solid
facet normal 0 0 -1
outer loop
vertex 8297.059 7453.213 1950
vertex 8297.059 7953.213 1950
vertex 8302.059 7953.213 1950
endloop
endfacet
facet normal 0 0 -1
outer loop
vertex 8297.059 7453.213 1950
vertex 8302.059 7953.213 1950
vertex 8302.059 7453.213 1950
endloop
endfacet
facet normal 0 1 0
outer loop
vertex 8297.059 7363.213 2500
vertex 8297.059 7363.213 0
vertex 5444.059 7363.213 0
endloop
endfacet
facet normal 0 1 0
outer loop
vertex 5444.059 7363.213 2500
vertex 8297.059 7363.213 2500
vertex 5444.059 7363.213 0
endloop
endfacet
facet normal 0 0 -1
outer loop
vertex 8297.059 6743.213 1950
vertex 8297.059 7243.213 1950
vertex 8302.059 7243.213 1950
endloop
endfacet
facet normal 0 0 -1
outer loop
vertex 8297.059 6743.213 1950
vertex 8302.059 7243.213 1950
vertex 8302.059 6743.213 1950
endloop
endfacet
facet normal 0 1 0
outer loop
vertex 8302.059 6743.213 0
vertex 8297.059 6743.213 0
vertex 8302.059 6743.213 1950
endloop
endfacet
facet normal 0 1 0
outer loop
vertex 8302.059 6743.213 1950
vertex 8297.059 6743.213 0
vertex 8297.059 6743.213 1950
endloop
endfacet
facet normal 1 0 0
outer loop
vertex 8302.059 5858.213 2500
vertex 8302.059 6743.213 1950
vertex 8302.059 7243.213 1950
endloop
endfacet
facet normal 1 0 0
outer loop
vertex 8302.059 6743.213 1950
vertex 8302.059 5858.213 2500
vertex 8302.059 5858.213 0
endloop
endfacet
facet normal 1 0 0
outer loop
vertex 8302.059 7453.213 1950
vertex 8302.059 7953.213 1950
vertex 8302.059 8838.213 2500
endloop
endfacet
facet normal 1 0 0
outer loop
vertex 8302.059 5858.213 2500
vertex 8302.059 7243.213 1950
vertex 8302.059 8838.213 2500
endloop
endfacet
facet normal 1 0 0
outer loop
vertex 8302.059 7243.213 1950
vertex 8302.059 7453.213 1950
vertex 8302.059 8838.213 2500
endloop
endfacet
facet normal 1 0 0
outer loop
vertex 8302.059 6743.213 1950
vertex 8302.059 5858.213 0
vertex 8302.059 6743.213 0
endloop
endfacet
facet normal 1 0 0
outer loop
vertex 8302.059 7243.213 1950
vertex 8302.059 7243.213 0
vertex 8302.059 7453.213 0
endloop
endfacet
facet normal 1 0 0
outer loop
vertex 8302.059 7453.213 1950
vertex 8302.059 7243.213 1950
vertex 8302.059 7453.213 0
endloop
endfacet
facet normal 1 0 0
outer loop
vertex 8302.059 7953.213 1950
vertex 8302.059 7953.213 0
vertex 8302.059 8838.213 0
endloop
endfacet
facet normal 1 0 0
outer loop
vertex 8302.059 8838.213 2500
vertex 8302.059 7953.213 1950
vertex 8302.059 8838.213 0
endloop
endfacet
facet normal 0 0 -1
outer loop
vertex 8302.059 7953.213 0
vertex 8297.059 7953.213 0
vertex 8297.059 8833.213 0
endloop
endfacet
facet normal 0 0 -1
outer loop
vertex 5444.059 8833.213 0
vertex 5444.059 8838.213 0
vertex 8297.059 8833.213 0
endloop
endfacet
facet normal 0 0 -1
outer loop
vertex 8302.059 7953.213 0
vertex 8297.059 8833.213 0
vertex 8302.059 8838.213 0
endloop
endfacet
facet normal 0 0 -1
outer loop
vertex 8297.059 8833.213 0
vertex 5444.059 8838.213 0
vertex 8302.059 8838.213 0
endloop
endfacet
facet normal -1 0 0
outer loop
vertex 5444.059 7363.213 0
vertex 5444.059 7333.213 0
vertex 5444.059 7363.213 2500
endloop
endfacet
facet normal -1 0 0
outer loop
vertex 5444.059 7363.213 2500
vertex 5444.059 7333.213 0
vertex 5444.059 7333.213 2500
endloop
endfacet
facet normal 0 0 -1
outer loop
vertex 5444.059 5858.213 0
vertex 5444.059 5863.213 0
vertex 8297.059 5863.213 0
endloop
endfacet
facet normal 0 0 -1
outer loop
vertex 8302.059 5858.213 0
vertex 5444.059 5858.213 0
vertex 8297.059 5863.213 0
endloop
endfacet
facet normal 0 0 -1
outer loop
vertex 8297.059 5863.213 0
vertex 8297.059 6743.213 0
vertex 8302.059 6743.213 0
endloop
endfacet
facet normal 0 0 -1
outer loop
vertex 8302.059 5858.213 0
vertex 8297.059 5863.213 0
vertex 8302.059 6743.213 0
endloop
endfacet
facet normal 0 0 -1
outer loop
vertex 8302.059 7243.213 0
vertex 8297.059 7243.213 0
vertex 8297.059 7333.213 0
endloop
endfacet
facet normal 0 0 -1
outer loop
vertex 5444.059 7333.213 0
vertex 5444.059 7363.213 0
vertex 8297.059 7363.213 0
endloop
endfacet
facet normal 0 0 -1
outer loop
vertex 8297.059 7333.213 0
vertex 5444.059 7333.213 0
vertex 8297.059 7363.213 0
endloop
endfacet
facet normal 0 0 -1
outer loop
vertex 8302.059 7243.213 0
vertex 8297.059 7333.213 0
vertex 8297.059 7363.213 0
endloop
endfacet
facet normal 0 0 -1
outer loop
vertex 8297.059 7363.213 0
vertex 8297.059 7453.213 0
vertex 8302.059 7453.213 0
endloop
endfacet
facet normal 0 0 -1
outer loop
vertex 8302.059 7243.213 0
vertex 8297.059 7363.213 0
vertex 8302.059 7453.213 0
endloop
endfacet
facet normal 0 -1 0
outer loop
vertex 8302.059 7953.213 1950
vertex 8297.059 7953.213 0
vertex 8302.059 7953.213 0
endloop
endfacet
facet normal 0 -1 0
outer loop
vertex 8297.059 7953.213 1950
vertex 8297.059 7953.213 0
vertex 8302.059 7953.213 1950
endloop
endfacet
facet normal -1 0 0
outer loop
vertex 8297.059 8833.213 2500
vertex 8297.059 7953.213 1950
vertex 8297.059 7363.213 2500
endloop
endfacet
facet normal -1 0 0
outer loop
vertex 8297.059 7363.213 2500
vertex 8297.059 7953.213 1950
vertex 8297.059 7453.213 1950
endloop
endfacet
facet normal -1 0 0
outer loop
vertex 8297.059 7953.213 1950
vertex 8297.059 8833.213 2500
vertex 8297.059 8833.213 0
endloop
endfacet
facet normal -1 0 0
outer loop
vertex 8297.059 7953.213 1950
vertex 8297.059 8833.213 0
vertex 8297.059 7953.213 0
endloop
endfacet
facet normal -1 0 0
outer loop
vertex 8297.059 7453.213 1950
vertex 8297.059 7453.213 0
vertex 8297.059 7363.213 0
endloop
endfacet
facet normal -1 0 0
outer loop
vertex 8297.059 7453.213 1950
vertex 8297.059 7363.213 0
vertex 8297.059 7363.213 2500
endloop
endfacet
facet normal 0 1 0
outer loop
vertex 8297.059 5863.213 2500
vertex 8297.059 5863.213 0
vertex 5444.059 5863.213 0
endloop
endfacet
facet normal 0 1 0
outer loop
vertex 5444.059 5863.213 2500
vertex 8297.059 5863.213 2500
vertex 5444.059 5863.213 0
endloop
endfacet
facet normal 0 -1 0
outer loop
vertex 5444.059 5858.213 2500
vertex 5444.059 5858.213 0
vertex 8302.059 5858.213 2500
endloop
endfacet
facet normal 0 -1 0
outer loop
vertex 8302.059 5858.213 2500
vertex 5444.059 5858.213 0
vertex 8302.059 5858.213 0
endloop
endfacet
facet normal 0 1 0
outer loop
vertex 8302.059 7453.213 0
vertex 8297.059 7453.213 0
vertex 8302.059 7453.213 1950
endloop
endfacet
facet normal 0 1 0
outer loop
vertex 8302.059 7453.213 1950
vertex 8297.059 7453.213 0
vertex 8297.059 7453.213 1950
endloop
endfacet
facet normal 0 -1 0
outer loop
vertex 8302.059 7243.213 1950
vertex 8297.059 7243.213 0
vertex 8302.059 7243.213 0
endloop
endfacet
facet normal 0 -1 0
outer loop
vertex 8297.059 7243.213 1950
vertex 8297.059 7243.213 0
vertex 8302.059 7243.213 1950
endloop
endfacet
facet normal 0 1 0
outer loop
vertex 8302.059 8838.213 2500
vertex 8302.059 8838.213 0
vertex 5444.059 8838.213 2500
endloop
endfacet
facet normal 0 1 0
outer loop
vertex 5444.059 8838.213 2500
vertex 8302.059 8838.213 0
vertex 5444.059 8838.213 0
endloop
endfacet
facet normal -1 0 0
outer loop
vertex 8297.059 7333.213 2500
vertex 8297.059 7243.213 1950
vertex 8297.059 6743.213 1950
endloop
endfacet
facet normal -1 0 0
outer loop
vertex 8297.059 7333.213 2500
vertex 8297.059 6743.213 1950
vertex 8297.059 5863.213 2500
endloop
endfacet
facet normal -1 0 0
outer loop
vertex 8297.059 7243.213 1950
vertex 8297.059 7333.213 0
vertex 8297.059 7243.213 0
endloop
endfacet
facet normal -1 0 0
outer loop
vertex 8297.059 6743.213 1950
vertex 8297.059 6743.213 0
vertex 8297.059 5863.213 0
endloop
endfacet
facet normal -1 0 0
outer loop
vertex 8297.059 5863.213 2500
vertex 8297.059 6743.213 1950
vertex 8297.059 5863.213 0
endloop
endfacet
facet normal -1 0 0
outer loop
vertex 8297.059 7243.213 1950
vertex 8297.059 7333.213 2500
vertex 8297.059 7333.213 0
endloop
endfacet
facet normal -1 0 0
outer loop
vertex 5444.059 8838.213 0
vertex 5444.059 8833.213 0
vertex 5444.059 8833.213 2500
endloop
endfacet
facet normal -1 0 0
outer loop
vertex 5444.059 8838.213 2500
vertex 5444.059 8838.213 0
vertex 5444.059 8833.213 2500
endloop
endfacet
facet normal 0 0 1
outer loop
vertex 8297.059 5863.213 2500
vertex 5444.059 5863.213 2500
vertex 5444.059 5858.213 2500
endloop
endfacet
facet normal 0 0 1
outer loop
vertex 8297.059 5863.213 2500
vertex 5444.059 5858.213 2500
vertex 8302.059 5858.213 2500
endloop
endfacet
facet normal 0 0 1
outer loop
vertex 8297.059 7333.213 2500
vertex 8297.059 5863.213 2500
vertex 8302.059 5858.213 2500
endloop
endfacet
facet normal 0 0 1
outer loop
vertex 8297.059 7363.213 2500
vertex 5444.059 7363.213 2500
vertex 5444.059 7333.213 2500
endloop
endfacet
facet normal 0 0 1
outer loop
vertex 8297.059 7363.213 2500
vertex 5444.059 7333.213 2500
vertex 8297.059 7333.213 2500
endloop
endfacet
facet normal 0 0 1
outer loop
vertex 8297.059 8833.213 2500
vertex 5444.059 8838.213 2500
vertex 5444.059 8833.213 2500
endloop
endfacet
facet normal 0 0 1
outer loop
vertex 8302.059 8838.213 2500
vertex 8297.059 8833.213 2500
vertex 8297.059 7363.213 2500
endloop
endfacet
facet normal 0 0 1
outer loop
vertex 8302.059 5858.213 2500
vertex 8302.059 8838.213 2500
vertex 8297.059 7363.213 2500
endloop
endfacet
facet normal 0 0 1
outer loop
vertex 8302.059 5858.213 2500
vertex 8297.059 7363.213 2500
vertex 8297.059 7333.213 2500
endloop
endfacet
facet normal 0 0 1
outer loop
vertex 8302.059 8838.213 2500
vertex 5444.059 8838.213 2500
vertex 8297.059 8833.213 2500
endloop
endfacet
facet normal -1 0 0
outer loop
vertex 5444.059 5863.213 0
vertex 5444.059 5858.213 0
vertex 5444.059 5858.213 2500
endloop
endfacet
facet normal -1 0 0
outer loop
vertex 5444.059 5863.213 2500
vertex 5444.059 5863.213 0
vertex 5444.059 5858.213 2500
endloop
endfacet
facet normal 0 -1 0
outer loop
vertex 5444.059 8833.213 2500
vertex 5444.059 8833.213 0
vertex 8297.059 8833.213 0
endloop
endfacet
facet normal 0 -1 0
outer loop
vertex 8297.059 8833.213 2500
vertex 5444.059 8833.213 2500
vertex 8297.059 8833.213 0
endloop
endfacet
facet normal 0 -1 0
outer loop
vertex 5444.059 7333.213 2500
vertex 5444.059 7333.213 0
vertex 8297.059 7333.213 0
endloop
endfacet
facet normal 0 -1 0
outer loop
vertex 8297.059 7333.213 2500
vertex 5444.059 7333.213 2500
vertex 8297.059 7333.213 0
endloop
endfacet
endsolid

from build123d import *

# Parameters (mm, degrees)
F1_DEPTH = 2500
F2_W     = 500
F2_H     = 1950
F3_DEPTH = 300
F4_W     = 101
F4_H     = 2500
F5_DEPTH = 460
F7_DEPTH = 4630


with BuildPart() as f1:
    # F0 (on Top) → F1 (new body)
    with BuildSketch(Plane.XY):
        Polygon((5348.059315, 5858.212916), (8302.059315, 5858.212916), (8302.059315, 7338.212916), (8302.059315, 7358.212916), (8302.059315, 8838.212916), (5348.059315, 8838.212916), (5348.059315, 8833.212852), (8297.059252, 8833.212852), (8297.059252, 7363.21298), (5343.059252, 7363.21298), (5343.059252, 7333.212852), (8297.059252, 7333.212852), (8297.059252, 5863.21298), (5348.059315, 5863.21298), align=None)
    extrude(amount=F1_DEPTH)

    # F2 (on face) → F3 (cut)
    with BuildSketch(Plane(origin=(8297.059252, 0, 0), x_dir=(0, -1, 0), z_dir=(-1, 0, 0))):
        with Locations((-7703.21298, 975)):
            Rectangle(F2_W, F2_H)
        with Locations((-6993.212852, 975)):
            Rectangle(F2_W, F2_H)
    extrude(amount=-F3_DEPTH, mode=Mode.SUBTRACT)

    # F4 (on face) → F5 (cut)
    with BuildSketch(Plane.XZ.offset(-7333.212852)):
        with Locations((5393.559252, 1250)):
            Rectangle(F4_W, F4_H)
    extrude(amount=-F5_DEPTH, mode=Mode.SUBTRACT)

    # F6 (on face) → F7 (cut)
    with BuildSketch(Plane.XZ.offset(-5858.212916)):
        Polygon((5444.059252, 0), (5444.059252, 2500), (5444.059252, 2649.641752), (5038.322449, 2649.641752), (5038.322449, -210.067511), (5444.059252, -140.881062), align=None)
    extrude(amount=-F7_DEPTH, mode=Mode.SUBTRACT)


solid = f1.part
